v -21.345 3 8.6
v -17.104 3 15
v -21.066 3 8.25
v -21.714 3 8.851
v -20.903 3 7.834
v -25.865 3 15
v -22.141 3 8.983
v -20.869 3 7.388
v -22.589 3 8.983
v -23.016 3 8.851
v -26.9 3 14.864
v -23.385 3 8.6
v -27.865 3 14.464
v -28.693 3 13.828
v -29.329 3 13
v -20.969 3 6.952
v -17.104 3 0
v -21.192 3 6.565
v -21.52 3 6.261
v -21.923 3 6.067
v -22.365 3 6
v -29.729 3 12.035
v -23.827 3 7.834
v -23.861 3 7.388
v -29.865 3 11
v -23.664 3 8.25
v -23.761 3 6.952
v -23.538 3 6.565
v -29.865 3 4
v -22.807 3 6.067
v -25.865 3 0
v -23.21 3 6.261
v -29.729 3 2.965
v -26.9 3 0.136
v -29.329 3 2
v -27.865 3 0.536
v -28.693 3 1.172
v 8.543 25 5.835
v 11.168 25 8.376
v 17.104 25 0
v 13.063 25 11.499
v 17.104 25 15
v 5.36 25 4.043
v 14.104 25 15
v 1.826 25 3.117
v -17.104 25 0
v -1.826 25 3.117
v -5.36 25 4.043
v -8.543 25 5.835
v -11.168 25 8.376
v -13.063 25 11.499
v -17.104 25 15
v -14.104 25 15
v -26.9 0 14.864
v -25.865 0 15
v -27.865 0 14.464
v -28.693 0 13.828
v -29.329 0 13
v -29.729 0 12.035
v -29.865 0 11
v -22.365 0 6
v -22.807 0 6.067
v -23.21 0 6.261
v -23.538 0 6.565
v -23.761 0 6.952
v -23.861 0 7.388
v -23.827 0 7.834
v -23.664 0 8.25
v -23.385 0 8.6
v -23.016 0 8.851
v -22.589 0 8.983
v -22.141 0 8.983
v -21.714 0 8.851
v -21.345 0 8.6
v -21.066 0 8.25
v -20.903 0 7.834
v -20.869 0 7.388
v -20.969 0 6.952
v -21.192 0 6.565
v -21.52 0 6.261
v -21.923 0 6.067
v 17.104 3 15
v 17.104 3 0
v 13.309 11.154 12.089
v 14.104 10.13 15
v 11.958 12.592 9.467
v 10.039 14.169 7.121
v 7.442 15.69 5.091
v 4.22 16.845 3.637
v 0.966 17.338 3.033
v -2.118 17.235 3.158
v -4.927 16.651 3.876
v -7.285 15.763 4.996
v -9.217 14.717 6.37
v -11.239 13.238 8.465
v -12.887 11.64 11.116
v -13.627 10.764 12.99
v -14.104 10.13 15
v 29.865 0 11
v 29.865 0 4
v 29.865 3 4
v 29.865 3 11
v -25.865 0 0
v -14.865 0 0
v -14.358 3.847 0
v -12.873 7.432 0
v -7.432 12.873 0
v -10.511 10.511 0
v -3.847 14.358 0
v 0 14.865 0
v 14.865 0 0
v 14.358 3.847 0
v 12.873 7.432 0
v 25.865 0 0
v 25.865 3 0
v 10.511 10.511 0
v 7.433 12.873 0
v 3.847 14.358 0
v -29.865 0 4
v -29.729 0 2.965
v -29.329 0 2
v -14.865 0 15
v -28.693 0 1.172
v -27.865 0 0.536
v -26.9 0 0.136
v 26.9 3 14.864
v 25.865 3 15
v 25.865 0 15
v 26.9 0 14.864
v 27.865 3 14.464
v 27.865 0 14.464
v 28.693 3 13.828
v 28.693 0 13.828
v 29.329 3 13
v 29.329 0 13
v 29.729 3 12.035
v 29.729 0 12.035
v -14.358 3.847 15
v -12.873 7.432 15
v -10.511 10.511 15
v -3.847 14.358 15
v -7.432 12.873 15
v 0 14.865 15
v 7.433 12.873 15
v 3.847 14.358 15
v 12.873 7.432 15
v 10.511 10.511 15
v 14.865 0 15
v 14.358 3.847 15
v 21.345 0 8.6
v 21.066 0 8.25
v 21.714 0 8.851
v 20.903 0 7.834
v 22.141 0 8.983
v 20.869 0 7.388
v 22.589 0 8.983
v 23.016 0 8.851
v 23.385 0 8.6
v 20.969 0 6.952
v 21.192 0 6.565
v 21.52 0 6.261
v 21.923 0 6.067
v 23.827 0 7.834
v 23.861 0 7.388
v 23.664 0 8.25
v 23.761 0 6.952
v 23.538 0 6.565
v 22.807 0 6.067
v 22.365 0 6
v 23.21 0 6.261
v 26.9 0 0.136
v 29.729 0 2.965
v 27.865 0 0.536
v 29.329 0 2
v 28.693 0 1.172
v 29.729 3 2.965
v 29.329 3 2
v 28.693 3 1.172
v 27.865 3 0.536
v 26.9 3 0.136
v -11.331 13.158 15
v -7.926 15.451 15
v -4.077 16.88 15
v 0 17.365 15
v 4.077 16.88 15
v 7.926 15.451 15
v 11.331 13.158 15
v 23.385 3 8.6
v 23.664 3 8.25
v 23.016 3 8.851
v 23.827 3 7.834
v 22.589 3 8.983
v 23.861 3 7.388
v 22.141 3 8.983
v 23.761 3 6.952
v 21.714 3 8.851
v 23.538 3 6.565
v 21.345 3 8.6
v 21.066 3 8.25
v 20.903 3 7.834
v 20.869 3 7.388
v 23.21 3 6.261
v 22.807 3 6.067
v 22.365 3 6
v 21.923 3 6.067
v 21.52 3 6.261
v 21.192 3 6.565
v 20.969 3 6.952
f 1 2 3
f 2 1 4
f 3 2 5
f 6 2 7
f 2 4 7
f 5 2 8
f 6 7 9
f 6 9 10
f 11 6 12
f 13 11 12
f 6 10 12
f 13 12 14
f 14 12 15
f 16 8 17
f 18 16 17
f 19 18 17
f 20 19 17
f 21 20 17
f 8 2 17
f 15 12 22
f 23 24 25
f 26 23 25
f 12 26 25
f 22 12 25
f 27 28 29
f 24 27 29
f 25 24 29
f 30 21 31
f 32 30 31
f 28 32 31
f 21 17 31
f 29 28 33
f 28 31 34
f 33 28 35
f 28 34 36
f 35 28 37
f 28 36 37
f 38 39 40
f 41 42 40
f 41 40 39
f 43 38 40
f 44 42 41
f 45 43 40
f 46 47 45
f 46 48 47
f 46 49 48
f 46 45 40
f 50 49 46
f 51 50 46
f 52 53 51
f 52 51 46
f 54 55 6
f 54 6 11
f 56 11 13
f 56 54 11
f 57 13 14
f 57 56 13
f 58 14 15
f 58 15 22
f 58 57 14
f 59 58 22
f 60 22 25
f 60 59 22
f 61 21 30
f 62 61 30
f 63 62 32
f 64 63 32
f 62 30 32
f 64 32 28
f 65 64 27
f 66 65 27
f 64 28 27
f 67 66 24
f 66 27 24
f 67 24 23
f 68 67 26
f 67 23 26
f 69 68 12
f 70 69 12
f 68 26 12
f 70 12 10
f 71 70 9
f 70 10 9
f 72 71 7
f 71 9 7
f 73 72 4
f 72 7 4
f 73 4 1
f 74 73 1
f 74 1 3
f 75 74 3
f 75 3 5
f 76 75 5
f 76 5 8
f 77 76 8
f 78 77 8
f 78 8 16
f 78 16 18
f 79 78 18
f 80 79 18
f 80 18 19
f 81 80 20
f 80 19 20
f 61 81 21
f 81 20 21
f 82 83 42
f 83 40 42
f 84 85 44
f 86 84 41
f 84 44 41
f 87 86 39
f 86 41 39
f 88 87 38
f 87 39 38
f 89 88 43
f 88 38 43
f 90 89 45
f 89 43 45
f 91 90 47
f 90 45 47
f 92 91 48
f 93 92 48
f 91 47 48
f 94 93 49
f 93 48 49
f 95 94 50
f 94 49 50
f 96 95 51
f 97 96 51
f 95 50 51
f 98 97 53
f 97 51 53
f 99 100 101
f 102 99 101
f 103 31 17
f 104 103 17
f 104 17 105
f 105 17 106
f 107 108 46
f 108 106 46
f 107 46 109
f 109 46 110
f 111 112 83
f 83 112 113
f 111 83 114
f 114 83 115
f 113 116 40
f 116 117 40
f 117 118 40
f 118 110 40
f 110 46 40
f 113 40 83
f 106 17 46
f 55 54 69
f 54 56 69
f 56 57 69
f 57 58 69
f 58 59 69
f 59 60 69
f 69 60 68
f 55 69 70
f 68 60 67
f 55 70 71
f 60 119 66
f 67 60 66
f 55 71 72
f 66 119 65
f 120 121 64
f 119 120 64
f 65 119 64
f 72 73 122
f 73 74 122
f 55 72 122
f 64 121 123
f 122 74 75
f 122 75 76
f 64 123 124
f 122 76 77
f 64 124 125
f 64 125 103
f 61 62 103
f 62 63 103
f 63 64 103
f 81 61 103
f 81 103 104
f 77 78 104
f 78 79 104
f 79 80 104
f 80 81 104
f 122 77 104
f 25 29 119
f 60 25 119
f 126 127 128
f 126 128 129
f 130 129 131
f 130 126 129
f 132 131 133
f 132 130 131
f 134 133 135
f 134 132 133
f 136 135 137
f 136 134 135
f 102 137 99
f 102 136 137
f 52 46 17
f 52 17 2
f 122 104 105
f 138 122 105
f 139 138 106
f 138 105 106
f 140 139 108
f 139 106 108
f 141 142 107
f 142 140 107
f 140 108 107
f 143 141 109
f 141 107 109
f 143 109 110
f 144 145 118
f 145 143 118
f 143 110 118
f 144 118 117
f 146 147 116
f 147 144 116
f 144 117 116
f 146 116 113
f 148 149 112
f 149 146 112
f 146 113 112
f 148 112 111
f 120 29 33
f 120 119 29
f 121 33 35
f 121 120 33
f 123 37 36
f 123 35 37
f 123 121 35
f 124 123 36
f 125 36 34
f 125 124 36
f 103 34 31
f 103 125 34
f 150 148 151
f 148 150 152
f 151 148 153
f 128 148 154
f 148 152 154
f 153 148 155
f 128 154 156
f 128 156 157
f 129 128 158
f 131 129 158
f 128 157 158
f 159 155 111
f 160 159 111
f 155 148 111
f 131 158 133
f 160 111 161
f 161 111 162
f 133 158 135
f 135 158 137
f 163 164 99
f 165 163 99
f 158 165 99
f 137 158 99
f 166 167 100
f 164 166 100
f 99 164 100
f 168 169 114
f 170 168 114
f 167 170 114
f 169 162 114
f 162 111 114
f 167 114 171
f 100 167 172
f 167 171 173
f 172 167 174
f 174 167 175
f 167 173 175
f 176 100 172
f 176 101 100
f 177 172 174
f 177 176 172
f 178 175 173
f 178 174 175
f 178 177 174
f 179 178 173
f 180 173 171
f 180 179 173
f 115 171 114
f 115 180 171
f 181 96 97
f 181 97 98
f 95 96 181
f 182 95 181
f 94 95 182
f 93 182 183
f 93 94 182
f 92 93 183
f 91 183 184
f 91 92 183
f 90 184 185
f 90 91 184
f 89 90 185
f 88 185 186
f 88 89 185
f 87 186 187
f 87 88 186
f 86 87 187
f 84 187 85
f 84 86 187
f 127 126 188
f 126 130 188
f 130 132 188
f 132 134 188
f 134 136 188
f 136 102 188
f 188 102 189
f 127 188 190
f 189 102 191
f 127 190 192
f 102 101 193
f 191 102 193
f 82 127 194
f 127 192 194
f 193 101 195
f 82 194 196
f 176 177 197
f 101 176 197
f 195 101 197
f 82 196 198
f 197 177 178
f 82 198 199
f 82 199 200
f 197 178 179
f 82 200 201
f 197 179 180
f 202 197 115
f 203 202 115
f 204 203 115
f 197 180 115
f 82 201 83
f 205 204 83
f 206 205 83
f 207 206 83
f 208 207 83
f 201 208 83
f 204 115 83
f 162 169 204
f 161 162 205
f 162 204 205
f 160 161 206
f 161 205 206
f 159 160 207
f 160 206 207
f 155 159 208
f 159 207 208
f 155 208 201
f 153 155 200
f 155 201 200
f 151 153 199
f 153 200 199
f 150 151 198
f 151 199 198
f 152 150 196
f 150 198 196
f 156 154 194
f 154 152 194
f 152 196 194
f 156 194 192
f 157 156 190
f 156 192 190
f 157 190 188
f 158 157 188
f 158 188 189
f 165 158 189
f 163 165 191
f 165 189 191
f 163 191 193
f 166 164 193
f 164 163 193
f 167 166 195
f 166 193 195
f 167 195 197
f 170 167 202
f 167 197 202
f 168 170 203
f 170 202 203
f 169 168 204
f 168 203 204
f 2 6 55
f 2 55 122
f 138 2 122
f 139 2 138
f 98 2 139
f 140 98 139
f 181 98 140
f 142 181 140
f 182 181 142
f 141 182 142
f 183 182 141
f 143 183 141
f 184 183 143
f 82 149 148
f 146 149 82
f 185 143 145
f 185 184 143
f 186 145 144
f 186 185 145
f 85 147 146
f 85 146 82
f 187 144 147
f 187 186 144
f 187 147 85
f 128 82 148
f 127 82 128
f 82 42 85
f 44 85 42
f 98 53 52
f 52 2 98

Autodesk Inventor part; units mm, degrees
ref_plane "YZ Plane" through (0, 0, 0) normal (1, 0, 0) x (0, 1, 0)
ref_plane "XY Plane" through (0, 0, 0) normal (0, 0, 1) x (1, 0, 0)
sketch "Sketch1" plane through (0, 0, 0) normal (0, 0, 1) x (1, 0, 0)
  arc A0 (14.865, 0) -> (-14.865, 0) centre (0, 0) ccw
  arc A1 (17.1039, 3) -> (-17.1039, 3) centre (0, 0) ccw
  line L0 (-17.1039, 3) -> (-29.865, 3)
  line L1 (-29.865, 3) -> (-29.865, 0)
  line L2 (-29.865, 0) -> (-14.865, 0)
  line L3 (14.865, 0) -> (29.865, 0)
  line L4 (29.865, 0) -> (29.865, 3)
  line L5 (29.865, 3) -> (17.1039, 3)
  dimension "d0" = 3
  dimension "d1" = 14.865
  dimension "d2" = 2.5
  dimension "d3" = 15
extrude "Extrusion1" add sketch "Sketch1" along normal blind 15
sketch "Sketch2" plane through (-29.865, 0, 0) normal (0, -1, 0) x (1, 0, 0)
  line L0 (0, 15) -> (15, 15) projected
  line L1 (0, 0) -> (0, 15) projected
  point P0 (29.865, 0)
  point P1 (7.5, 7.5)
  point P2 (7.5, 15)
  point P3 (0, 7.5)
hole "Hole1" at (-22.365, 0, 7.5) direction (0, 1, 0) diameter 3 end through all
mirror "Mirror1" about plane through (0, 0, 0) normal (1, 0, 0) of "Hole1"
ref_plane "Work Plane1" through (0, 25, 0) normal (0, 1, 0) x (-1, 0, 0)
sketch "Sketch3" plane through (0, 25, 0) normal (0, 1, 0) x (-1, 0, 0)
  line L0 (-17.1039, 0) -> (17.1039, 0) projected
  line L1 (-17.1039, 0) -> (-17.1039, 15) projected
  line L2 (17.1039, 0) -> (17.1039, 15) projected
  line L3 (-17.1039, 15) -> (-14.1039, 15)
  line L4 (17.1039, 15) -> (14.1039, 15)
  arc A0 (-14.1039, 15) -> (14.1039, 15) centre (0, 17.2883) ccw
  point P0 (0, 0)
  point P1 (0, 3)
  dimension "d14" = 3
  dimension "d15" = 3
  dimension "d16" = 3
extrude "Extrusion2" add sketch "Sketch3" against normal up to next
fillet "Fillet1" radius 4 4 edges at (-29.865, 1.5, 15) (-29.865, 1.5, 0) (29.865, 1.5, 0) (29.865, 1.5, 15)
properties part number "Motor Mount C-Clamp Base"
